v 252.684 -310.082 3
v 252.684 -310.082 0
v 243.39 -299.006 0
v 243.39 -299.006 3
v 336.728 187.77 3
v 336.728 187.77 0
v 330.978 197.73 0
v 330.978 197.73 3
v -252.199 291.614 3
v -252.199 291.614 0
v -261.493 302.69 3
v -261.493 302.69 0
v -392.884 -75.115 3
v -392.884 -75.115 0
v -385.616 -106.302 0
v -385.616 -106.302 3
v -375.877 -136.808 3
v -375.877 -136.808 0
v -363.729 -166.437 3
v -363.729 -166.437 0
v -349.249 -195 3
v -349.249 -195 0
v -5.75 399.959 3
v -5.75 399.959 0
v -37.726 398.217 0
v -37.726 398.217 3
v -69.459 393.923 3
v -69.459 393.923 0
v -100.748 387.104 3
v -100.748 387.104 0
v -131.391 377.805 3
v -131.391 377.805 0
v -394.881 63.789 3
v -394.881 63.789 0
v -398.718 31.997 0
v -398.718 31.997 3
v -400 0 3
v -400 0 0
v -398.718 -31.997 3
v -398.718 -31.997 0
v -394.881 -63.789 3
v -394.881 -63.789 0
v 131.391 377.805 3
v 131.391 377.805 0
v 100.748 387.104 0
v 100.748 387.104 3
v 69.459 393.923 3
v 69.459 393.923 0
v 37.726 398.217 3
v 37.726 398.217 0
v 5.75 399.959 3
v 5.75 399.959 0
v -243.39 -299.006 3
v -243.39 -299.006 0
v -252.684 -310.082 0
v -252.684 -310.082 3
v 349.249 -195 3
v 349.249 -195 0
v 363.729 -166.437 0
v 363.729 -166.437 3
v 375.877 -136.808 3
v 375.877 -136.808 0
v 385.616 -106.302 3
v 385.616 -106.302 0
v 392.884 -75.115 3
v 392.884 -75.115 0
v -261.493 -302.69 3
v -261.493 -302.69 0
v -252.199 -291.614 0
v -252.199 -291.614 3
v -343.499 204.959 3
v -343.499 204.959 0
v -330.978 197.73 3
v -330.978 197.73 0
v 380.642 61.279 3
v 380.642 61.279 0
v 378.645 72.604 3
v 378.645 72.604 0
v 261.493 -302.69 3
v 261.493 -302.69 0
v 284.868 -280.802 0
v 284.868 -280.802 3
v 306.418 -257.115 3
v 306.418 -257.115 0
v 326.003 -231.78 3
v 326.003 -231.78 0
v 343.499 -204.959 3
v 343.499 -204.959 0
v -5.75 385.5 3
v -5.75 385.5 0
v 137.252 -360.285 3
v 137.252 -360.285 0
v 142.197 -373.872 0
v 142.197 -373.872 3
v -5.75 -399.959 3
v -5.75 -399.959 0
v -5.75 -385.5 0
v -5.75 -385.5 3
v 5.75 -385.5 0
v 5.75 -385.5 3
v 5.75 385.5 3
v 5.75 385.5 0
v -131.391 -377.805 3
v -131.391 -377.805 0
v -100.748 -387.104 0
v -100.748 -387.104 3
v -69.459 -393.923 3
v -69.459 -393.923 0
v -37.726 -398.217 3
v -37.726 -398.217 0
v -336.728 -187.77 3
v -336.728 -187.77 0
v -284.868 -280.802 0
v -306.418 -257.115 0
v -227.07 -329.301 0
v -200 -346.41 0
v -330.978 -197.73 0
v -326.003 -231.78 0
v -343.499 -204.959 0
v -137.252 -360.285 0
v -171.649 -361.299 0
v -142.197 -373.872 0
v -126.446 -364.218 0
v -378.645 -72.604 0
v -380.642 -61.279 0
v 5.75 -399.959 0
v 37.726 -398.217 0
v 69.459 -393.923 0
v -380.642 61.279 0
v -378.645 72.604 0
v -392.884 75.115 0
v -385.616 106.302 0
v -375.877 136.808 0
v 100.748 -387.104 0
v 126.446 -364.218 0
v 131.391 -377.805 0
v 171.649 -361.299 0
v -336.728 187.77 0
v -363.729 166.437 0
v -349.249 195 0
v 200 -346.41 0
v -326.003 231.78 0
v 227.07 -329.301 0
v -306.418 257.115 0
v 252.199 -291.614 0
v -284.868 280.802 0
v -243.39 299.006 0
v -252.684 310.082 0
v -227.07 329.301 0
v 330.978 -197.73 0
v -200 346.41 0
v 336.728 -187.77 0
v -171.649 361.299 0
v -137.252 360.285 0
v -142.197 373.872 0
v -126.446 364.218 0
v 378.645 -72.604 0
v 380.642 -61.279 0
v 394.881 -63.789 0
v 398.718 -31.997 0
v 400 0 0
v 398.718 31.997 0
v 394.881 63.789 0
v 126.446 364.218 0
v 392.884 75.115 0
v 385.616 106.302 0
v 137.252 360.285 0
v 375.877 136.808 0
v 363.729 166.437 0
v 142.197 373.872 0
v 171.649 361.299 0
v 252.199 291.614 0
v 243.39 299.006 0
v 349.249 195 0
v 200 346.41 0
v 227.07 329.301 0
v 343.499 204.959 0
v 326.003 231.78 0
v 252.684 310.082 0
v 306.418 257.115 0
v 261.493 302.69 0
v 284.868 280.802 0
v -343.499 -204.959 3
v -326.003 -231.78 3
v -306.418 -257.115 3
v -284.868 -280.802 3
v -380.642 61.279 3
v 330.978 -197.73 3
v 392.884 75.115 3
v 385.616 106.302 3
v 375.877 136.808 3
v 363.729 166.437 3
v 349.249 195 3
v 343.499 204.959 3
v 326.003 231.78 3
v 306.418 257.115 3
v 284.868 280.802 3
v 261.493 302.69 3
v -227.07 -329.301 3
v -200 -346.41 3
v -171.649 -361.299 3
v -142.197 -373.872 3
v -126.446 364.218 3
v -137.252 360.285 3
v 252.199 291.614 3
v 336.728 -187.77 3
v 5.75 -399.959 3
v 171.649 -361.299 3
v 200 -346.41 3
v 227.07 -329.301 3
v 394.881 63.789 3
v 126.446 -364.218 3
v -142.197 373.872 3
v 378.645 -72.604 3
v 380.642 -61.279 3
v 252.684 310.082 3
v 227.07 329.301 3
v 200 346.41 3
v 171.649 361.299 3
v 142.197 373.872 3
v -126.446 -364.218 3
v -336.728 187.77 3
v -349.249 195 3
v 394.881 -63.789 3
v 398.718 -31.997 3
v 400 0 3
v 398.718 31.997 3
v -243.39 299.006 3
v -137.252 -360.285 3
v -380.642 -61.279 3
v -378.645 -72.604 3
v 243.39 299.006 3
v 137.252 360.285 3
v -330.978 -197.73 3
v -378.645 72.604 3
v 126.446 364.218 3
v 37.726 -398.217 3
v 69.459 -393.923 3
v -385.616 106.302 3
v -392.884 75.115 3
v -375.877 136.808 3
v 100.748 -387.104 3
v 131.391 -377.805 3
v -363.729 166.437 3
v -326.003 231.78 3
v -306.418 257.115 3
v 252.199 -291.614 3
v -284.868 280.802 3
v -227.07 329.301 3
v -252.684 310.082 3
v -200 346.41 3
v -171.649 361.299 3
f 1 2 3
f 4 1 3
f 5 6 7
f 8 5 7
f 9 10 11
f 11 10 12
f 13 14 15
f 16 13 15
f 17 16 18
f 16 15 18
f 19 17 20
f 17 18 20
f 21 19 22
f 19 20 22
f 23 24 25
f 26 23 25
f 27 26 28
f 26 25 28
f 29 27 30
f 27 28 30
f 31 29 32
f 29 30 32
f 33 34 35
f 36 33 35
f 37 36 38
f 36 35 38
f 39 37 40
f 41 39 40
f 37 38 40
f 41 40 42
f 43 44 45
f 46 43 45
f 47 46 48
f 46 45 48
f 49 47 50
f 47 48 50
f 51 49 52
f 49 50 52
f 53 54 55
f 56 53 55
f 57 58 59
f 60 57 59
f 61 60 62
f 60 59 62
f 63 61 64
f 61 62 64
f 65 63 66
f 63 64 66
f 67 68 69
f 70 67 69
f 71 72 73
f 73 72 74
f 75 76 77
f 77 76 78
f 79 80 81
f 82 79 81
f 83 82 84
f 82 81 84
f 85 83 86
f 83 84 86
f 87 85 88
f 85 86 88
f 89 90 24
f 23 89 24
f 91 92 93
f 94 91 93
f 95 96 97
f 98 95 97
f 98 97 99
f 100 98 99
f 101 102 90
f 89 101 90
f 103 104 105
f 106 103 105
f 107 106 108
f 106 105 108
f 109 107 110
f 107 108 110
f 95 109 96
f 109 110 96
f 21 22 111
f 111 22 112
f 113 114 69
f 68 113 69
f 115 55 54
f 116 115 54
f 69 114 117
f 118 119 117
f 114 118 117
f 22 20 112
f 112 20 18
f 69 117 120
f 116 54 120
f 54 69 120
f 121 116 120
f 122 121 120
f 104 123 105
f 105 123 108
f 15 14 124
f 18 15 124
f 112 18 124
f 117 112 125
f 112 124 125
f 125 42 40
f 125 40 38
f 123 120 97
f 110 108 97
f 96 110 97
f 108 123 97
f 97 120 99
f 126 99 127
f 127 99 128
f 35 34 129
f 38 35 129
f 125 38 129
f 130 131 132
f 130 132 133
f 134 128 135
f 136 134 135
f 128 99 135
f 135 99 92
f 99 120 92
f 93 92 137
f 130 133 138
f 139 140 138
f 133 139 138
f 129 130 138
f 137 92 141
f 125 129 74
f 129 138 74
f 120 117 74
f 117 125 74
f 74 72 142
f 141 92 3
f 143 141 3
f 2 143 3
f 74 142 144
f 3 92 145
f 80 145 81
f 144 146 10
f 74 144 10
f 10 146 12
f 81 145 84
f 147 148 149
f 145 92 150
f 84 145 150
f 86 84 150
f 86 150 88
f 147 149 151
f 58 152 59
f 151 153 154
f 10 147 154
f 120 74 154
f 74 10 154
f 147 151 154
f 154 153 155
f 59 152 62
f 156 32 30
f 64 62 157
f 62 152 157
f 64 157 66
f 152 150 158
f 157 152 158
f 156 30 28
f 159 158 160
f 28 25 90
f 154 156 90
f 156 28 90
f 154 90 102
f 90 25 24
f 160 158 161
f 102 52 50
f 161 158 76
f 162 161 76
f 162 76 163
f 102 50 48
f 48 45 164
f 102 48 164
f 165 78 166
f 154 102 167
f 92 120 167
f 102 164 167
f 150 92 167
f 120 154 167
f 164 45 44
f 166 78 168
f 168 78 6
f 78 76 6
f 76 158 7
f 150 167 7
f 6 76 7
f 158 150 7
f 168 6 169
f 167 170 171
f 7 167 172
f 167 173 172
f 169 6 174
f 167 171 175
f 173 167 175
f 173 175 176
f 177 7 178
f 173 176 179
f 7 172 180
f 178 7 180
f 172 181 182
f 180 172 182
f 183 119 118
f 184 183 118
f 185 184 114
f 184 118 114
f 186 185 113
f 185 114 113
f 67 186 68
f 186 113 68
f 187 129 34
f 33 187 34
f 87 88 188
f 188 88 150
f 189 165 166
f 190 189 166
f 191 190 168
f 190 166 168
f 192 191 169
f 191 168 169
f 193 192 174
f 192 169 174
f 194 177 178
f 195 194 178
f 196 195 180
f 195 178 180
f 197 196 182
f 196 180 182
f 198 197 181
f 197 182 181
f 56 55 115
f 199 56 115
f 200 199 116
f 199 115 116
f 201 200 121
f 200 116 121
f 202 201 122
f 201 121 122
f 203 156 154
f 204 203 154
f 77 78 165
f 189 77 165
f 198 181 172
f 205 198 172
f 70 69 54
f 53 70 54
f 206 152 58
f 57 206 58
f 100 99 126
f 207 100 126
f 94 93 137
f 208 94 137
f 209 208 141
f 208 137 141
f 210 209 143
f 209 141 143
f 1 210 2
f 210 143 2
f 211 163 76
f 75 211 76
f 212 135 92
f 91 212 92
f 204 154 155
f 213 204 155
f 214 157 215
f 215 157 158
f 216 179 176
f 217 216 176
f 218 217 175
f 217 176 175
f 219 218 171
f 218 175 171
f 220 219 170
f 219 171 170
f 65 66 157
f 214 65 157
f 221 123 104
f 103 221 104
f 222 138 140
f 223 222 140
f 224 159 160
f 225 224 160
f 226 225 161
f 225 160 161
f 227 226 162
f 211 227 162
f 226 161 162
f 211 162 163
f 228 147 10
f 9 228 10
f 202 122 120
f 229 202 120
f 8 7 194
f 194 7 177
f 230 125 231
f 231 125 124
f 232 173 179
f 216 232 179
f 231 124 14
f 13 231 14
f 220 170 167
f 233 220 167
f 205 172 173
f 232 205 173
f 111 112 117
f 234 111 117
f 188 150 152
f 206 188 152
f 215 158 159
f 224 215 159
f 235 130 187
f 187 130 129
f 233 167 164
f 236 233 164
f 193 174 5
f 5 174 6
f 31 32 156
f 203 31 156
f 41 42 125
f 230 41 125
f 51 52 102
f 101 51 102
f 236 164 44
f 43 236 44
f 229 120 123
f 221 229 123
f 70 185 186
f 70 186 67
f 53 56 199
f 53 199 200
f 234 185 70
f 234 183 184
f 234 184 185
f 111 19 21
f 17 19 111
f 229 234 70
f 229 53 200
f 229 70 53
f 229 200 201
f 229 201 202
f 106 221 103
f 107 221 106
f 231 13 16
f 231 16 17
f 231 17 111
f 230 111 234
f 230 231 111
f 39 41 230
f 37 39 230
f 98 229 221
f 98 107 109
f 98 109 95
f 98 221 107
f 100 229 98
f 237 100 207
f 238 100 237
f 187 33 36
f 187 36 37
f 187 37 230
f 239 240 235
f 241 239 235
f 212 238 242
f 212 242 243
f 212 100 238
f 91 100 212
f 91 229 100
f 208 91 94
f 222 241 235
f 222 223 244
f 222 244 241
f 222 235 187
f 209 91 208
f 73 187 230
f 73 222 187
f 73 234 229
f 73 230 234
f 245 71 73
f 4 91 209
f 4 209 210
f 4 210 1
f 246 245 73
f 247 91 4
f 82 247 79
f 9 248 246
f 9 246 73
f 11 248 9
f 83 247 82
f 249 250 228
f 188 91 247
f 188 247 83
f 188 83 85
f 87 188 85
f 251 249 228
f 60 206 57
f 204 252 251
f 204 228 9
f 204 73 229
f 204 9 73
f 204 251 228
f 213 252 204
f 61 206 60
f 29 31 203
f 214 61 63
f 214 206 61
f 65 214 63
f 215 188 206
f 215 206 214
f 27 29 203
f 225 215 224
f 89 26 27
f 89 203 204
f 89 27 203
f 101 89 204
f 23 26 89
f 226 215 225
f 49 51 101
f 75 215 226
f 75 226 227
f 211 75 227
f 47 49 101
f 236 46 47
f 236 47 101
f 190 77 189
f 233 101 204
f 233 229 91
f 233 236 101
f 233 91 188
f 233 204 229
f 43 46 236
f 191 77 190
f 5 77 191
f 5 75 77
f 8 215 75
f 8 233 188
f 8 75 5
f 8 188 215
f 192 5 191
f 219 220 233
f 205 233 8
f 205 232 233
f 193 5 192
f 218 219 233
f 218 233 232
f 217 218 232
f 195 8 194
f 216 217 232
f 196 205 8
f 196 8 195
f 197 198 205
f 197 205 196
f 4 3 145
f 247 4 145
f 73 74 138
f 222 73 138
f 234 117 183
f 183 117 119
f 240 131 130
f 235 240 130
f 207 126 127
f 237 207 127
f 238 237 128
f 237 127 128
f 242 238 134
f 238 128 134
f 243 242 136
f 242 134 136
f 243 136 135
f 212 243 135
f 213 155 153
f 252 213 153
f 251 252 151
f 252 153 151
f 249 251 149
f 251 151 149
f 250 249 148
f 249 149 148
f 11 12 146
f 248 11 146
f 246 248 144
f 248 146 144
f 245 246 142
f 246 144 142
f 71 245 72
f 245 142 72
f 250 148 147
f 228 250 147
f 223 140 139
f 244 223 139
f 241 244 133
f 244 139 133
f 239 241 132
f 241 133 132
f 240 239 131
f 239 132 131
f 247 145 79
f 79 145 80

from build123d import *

# Parameters (mm, degrees)
F1_DEPTH = 3


with BuildPart() as f1:
    # F0 (on Top) → F1 (new body)
    with BuildSketch(Plane.XY):
        with BuildLine():
            Line((-5.75, 385.5), (-5.75, 399.95867))
            ThreePointArc((-5.75, 399.95867), (-69.459271, 393.923101), (-131.390689, 377.804826))
            Line((-131.390689, 377.804826), (-126.445533, 364.218121))
            Line((-126.445533, 364.218121), (-137.251998, 360.284889))
            Line((-137.251998, 360.284889), (-142.197154, 373.871595))
            ThreePointArc((-142.197154, 373.871595), (-200, 346.410162), (-252.683722, 310.082145))
            Line((-252.683722, 310.082145), (-243.389868, 299.006162))
            Line((-243.389868, 299.006162), (-252.199379, 291.614104))
            Line((-252.199379, 291.614104), (-261.493233, 302.690088))
            ThreePointArc((-261.493233, 302.690088), (-306.417777, 257.115044), (-343.499368, 204.958981))
            Line((-343.499368, 204.958981), (-330.977793, 197.729646))
            Line((-330.977793, 197.729646), (-336.727793, 187.770354))
            Line((-336.727793, 187.770354), (-349.249368, 194.999689))
            ThreePointArc((-349.249368, 194.999689), (-375.877048, 136.808057), (-392.883922, 75.114739))
            Line((-392.883922, 75.114739), (-378.644912, 72.604017))
            Line((-378.644912, 72.604017), (-380.641866, 61.278728))
            Line((-380.641866, 61.278728), (-394.880876, 63.78945))
            ThreePointArc((-394.880876, 63.78945), (-400, 0), (-394.880876, -63.78945))
            Line((-394.880876, -63.78945), (-380.641866, -61.278728))
            Line((-380.641866, -61.278728), (-378.644912, -72.604017))
            Line((-378.644912, -72.604017), (-392.883922, -75.114739))
            ThreePointArc((-392.883922, -75.114739), (-375.877048, -136.808057), (-349.249368, -194.999689))
            Line((-349.249368, -194.999689), (-336.727793, -187.770354))
            Line((-336.727793, -187.770354), (-330.977793, -197.729646))
            Line((-330.977793, -197.729646), (-343.499368, -204.958981))
            ThreePointArc((-343.499368, -204.958981), (-306.417777, -257.115044), (-261.493233, -302.690088))
            Line((-261.493233, -302.690088), (-252.199379, -291.614104))
            Line((-252.199379, -291.614104), (-243.389868, -299.006162))
            Line((-243.389868, -299.006162), (-252.683722, -310.082145))
            ThreePointArc((-252.683722, -310.082145), (-200, -346.410162), (-142.197154, -373.871595))
            Line((-142.197154, -373.871595), (-137.251998, -360.284889))
            Line((-137.251998, -360.284889), (-126.445533, -364.218121))
            Line((-126.445533, -364.218121), (-131.390689, -377.804826))
            ThreePointArc((-131.390689, -377.804826), (-69.459271, -393.923101), (-5.75, -399.95867))
            Line((-5.75, -399.95867), (-5.75, -385.5))
            Line((-5.75, -385.5), (5.75, -385.5))
            Line((5.75, -385.5), (5.75, -399.95867))
            ThreePointArc((5.75, -399.95867), (69.459271, -393.923101), (131.390689, -377.804826))
            Line((131.390689, -377.804826), (126.445533, -364.218121))
            Line((126.445533, -364.218121), (137.251998, -360.284889))
            Line((137.251998, -360.284889), (142.197154, -373.871595))
            ThreePointArc((142.197154, -373.871595), (200, -346.410162), (252.683722, -310.082145))
            Line((252.683722, -310.082145), (243.389868, -299.006162))
            Line((243.389868, -299.006162), (252.199379, -291.614104))
            Line((252.199379, -291.614104), (261.493233, -302.690088))
            ThreePointArc((261.493233, -302.690088), (306.417777, -257.115044), (343.499368, -204.958981))
            Line((343.499368, -204.958981), (330.977793, -197.729646))
            Line((330.977793, -197.729646), (336.727793, -187.770354))
            Line((336.727793, -187.770354), (349.249368, -194.999689))
            ThreePointArc((349.249368, -194.999689), (375.877048, -136.808057), (392.883922, -75.114739))
            Line((392.883922, -75.114739), (378.644912, -72.604017))
            Line((378.644912, -72.604017), (380.641866, -61.278728))
            Line((380.641866, -61.278728), (394.880876, -63.78945))
            ThreePointArc((394.880876, -63.78945), (400, 0), (394.880876, 63.78945))
            Line((394.880876, 63.78945), (380.641866, 61.278728))
            Line((380.641866, 61.278728), (378.644912, 72.604017))
            Line((378.644912, 72.604017), (392.883922, 75.114739))
            ThreePointArc((392.883922, 75.114739), (375.877048, 136.808057), (349.249368, 194.999689))
            Line((349.249368, 194.999689), (336.727793, 187.770354))
            Line((336.727793, 187.770354), (330.977793, 197.729646))
            Line((330.977793, 197.729646), (343.499368, 204.958981))
            ThreePointArc((343.499368, 204.958981), (306.417777, 257.115044), (261.493233, 302.690088))
            Line((261.493233, 302.690088), (252.199379, 291.614104))
            Line((252.199379, 291.614104), (243.389868, 299.006162))
            Line((243.389868, 299.006162), (252.683722, 310.082145))
            ThreePointArc((252.683722, 310.082145), (200, 346.410162), (142.197154, 373.871595))
            Line((142.197154, 373.871595), (137.251998, 360.284889))
            Line((137.251998, 360.284889), (126.445533, 364.218121))
            Line((126.445533, 364.218121), (131.390689, 377.804826))
            ThreePointArc((131.390689, 377.804826), (69.459271, 393.923101), (5.75, 399.95867))
            Line((5.75, 399.95867), (5.75, 385.5))
            Line((5.75, 385.5), (-5.75, 385.5))
        make_face()
    extrude(amount=F1_DEPTH)


solid = f1.part
